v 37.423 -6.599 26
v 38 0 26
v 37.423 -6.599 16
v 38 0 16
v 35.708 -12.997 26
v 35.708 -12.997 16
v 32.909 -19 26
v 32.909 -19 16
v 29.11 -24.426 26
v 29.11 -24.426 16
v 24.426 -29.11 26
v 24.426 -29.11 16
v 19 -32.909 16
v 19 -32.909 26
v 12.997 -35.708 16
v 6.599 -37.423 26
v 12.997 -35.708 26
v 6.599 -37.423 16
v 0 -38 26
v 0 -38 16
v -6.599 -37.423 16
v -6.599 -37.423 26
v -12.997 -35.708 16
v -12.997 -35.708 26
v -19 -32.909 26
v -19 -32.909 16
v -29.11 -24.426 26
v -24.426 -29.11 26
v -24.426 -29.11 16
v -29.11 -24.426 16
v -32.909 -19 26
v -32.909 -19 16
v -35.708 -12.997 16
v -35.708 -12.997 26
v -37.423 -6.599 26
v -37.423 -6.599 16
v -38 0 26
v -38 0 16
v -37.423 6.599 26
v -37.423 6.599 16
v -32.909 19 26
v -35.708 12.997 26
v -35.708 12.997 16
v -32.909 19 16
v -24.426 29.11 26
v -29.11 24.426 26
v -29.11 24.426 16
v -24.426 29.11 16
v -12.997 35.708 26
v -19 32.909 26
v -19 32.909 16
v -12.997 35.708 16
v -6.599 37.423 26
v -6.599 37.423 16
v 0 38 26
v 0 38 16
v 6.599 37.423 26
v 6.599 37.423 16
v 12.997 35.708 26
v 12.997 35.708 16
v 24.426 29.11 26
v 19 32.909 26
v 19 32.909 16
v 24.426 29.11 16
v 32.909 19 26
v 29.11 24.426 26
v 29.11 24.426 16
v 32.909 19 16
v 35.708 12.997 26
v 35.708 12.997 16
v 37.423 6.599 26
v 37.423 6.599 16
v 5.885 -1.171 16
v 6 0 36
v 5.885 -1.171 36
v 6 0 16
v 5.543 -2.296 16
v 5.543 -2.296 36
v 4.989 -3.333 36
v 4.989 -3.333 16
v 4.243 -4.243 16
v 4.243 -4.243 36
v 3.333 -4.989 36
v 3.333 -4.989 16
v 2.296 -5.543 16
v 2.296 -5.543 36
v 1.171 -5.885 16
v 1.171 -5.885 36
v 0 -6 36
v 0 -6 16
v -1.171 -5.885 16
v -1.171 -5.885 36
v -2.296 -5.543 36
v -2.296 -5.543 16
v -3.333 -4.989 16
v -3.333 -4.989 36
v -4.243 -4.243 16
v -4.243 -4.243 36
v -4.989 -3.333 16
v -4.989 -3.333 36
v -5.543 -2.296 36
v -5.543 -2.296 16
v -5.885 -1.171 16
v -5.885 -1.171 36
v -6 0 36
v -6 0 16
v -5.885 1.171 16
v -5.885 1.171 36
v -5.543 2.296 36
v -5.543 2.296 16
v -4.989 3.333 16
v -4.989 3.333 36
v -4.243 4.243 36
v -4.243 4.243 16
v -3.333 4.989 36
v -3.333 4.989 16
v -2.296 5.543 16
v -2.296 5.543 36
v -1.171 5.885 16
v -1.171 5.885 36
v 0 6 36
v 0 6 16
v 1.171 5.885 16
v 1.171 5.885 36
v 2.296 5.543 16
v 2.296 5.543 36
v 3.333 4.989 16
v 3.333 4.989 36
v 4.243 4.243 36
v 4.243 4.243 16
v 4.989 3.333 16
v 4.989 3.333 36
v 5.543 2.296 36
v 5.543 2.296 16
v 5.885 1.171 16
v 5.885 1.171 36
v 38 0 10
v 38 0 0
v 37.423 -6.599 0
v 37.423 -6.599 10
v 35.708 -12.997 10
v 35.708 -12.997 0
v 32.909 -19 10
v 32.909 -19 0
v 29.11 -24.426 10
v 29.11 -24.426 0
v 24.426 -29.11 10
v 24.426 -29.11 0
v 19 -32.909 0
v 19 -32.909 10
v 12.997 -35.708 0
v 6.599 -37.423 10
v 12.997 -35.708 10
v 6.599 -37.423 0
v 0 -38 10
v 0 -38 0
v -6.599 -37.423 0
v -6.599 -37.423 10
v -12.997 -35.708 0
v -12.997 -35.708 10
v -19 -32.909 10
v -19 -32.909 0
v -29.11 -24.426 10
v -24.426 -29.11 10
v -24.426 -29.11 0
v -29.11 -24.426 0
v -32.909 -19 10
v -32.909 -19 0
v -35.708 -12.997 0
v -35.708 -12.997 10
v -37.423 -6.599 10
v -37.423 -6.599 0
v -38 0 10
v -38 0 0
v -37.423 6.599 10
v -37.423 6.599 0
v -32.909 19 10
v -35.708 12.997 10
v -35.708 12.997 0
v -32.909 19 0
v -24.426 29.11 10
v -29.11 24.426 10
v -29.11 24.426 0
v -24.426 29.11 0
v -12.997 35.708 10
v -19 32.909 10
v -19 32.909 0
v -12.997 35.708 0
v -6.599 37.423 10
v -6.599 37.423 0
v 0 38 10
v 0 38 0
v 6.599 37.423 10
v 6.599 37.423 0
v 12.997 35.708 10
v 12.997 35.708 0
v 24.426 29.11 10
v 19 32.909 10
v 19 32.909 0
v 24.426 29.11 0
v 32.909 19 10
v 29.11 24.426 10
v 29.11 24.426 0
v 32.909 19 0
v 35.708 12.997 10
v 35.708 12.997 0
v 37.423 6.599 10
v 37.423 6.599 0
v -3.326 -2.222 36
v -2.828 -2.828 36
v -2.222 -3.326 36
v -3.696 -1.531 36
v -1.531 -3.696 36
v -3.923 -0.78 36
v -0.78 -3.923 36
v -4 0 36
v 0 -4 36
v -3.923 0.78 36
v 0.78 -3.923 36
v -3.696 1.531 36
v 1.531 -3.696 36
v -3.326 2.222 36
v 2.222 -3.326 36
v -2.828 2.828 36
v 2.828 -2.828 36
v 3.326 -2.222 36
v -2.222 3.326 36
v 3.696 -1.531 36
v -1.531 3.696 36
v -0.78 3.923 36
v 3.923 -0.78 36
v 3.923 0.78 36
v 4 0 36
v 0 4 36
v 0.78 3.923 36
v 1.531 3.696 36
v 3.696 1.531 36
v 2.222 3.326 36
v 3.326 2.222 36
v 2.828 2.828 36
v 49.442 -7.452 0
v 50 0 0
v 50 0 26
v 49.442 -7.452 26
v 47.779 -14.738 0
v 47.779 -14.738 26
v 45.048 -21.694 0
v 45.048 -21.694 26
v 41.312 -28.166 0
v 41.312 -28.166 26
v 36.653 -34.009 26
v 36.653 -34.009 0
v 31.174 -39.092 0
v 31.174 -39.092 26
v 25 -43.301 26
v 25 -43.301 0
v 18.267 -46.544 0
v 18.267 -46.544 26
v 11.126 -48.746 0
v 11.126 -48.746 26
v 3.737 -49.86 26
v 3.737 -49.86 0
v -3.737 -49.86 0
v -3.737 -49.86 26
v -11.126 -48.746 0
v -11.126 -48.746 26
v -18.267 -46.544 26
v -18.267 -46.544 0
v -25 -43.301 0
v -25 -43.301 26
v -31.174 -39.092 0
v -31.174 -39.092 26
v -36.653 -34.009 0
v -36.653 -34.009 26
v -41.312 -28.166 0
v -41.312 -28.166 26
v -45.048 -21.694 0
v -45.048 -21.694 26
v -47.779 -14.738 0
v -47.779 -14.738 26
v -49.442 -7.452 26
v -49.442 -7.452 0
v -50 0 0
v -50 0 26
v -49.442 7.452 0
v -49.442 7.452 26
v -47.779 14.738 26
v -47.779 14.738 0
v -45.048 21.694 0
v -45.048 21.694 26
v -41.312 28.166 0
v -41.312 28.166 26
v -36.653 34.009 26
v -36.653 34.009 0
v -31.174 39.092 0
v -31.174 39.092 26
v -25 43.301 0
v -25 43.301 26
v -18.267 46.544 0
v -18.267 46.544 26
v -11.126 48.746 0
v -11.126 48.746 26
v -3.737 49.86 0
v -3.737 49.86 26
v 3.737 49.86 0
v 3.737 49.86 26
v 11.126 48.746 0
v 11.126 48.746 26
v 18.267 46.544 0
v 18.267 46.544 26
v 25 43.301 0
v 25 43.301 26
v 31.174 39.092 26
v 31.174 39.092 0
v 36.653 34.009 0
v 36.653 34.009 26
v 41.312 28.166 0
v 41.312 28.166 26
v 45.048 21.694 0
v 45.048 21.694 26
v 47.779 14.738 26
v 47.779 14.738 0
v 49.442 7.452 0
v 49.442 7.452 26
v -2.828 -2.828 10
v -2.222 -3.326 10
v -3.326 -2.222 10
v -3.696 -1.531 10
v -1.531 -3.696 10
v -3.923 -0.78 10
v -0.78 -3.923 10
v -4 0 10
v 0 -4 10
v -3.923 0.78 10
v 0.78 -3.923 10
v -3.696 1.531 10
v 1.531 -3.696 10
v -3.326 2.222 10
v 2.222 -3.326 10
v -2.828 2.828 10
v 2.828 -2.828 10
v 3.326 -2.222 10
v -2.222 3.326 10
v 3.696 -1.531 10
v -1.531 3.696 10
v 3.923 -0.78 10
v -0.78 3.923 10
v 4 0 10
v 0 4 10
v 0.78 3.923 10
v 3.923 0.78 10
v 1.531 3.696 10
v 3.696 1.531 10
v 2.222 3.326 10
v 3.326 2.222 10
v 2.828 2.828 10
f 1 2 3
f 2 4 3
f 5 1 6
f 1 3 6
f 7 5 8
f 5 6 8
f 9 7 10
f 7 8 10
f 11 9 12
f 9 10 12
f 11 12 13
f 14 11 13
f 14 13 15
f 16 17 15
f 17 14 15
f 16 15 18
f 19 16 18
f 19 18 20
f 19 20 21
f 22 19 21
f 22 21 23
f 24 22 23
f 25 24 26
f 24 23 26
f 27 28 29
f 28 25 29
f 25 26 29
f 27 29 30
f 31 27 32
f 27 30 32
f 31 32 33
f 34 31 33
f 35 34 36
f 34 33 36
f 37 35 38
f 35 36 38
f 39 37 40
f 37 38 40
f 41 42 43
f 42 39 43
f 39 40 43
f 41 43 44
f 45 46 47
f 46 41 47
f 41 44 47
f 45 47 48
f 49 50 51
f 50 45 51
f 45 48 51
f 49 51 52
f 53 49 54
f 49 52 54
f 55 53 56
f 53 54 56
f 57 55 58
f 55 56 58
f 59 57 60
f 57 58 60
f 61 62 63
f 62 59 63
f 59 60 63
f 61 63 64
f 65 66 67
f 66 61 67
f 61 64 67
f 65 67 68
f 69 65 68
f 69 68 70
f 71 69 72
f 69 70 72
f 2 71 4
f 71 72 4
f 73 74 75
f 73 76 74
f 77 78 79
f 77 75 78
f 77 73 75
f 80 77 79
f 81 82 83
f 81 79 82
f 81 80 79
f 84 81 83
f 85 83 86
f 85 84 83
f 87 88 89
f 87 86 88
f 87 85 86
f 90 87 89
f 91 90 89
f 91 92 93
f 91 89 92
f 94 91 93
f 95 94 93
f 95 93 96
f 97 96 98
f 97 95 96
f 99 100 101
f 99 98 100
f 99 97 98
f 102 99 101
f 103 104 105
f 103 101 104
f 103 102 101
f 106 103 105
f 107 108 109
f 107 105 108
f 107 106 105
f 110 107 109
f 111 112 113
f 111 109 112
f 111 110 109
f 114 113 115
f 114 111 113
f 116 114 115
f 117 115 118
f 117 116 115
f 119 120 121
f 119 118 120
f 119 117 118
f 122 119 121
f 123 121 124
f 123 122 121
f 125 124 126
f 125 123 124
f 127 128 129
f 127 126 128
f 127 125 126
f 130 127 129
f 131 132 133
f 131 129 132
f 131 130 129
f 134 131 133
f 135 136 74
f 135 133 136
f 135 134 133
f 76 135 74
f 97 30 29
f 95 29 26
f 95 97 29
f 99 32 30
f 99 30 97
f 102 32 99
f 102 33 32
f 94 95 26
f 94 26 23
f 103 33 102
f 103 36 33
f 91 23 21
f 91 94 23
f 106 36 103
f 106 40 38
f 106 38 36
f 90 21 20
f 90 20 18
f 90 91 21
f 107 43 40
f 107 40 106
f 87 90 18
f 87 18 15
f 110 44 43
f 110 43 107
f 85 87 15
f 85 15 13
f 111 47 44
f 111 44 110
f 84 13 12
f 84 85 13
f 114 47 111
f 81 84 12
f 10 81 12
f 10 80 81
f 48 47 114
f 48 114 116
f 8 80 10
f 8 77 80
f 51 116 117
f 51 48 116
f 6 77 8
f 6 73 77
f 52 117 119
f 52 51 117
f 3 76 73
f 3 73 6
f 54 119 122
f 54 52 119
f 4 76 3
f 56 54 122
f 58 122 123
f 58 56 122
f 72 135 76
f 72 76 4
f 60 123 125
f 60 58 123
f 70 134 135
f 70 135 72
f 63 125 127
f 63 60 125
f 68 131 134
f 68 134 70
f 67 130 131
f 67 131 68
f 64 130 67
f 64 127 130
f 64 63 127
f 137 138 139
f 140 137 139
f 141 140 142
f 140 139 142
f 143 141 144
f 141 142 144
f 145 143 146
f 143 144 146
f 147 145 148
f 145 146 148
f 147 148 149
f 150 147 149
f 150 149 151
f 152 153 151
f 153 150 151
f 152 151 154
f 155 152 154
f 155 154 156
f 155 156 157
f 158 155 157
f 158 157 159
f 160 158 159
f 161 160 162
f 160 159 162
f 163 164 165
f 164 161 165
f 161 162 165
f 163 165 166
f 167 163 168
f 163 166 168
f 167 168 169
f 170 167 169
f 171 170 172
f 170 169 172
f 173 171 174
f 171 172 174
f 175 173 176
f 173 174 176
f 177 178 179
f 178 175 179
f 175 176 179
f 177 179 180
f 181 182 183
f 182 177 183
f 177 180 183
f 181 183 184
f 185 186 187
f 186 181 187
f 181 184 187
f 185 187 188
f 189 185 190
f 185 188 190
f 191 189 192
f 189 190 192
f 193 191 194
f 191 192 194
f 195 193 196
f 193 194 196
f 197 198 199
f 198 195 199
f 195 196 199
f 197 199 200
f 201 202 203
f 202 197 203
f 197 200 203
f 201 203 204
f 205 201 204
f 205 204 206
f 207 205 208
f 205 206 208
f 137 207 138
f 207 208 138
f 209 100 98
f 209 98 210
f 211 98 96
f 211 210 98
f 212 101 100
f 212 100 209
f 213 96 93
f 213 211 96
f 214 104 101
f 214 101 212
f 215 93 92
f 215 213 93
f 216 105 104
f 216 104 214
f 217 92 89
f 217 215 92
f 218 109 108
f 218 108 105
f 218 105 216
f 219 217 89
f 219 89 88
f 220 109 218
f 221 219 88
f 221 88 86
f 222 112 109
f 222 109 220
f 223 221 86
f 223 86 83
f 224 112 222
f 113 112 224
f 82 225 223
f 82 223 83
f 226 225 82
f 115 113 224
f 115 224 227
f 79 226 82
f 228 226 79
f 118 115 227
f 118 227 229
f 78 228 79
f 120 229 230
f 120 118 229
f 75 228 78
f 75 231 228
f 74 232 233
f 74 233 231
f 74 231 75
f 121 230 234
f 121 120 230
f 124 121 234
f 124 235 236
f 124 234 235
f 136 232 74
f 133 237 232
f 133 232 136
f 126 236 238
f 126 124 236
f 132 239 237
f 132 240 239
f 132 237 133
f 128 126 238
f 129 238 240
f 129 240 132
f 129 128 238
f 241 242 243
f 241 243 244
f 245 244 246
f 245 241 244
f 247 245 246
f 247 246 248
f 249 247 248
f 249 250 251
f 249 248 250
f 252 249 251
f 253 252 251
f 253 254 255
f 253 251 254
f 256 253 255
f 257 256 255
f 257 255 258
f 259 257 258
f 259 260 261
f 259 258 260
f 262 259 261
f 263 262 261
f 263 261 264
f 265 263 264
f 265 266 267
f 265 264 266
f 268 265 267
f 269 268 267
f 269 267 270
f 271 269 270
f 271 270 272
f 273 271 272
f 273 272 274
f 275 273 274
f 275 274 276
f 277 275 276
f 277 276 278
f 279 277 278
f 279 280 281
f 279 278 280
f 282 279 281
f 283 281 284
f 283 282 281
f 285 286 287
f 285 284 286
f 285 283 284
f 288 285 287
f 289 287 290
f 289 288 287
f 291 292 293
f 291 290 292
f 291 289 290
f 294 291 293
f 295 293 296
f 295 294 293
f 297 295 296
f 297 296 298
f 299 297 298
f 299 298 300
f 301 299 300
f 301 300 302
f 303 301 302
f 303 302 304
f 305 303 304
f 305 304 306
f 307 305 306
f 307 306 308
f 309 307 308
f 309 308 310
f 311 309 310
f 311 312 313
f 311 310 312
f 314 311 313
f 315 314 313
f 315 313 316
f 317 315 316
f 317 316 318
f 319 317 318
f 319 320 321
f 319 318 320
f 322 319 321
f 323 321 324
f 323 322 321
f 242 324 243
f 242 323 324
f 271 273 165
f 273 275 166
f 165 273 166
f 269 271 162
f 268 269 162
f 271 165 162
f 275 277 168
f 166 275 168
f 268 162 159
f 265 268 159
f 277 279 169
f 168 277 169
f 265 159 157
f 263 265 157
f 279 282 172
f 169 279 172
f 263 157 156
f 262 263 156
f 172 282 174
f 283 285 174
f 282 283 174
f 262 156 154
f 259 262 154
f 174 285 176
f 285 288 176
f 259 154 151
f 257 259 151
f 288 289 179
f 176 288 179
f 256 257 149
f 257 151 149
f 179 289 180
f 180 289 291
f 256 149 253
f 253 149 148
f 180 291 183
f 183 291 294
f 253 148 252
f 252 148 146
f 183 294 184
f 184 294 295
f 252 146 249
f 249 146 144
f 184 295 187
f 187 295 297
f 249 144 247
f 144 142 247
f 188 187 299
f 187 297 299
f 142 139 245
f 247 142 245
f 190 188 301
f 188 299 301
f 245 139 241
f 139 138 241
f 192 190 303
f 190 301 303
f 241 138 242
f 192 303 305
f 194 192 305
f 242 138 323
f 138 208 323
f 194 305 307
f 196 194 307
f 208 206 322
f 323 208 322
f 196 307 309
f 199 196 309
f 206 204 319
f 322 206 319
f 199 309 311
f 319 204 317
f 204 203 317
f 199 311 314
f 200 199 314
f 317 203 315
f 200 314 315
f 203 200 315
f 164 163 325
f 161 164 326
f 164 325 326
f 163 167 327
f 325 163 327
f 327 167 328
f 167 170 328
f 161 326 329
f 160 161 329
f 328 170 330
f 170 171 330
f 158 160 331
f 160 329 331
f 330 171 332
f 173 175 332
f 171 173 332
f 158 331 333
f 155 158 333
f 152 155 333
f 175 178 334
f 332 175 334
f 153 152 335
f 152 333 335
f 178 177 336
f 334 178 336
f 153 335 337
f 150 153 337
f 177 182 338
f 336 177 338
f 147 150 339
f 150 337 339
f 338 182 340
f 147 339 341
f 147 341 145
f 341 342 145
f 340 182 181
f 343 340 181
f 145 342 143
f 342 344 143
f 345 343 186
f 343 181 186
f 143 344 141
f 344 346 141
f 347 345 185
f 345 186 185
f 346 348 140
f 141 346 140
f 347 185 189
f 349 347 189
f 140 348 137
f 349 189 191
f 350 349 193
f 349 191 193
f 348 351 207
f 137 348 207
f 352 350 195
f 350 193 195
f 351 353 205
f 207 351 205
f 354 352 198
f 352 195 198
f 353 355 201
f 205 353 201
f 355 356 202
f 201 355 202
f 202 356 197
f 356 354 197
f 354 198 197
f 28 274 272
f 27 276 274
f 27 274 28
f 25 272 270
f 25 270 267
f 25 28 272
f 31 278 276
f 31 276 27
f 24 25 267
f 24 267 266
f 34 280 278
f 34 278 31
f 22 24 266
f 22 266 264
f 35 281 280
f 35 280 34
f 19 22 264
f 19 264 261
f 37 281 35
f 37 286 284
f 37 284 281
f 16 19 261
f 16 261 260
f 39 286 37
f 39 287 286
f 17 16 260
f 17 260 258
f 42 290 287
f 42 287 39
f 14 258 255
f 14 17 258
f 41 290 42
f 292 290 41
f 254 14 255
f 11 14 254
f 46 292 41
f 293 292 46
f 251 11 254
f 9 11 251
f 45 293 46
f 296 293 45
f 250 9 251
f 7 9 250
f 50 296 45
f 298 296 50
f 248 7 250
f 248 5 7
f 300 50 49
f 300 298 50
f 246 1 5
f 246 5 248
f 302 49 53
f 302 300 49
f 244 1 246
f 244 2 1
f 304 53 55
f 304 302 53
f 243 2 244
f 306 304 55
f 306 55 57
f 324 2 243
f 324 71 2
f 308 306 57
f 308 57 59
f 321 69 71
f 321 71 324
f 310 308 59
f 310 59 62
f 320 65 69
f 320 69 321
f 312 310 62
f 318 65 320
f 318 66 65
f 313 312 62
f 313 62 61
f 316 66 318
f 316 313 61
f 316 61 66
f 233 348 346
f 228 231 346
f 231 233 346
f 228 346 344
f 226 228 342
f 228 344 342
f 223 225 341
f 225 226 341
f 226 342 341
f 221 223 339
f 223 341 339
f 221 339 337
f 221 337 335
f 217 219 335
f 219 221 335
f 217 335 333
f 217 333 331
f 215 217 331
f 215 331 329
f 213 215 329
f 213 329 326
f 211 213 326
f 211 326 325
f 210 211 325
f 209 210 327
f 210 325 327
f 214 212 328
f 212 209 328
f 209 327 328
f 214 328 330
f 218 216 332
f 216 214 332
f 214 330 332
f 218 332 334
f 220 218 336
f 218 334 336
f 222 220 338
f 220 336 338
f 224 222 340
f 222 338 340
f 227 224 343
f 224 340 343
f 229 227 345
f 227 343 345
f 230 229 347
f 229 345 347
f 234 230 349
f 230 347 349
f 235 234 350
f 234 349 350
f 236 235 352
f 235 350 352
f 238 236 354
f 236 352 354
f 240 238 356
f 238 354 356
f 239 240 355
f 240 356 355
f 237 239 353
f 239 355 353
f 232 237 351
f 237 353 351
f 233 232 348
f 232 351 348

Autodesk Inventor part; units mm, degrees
ref_plane "YZ Plane" through (0, 0, 0) normal (1, 0, 0) x (0, 1, 0)
ref_plane "XZ Plane" through (0, 0, 0) normal (0, 1, 0) x (-1, 0, 0)
ref_plane "XY Plane" through (0, 0, 0) normal (0, 0, 1) x (1, 0, 0)
sketch "Sketch1" plane through (0, 0, 0) normal (0, 0, 1) x (1, 0, 0)
  circle A0 centre (0, 0) radius 4
  circle A1 centre (0, 0) radius 50
  circle A2 centre (0, 0) radius 38
  dimension "d0" = 8
  dimension "d1" = 100
  dimension "d2" = 12
extrude "Extrusion1" add sketch "Sketch1" along normal blind 10 contours A1
sketch "Sketch2" plane through (0, 0, 10) normal (0, 0, 1) x (1, 0, 0)
  circle A0 centre (0, 0) radius 50
  circle A1 centre (0, 0) radius 4
  dimension "d5" = 8
  dimension "d6" = 100
sketch "Sketch3" plane through (0, 0, 10) normal (0, 0, 1) x (1, 0, 0)
  point P0 (0, 0)
extrude "Extrusion2" add sketch "Sketch2" along normal blind 6
sketch "Sketch4" plane through (0, 0, 16) normal (0, 0, 1) x (1, 0, 0)
  circle A0 centre (0, 0) radius 38
  circle A1 centre (0, 0) radius 50
  dimension "d9" = 76
  dimension "d10" = 100
extrude "Extrusion3" add sketch "Sketch4" along normal blind 10
sketch "Sketch5" plane through (0, 0, 16) normal (0, 0, 1) x (1, 0, 0)
  circle A0 centre (0, 0) radius 4
  circle A1 centre (0, 0) radius 6
  dimension "d13" = 8
  dimension "d14" = 12
extrude "Extrusion4" add sketch "Sketch5" along normal blind 20
properties part number "100mm wheel"
